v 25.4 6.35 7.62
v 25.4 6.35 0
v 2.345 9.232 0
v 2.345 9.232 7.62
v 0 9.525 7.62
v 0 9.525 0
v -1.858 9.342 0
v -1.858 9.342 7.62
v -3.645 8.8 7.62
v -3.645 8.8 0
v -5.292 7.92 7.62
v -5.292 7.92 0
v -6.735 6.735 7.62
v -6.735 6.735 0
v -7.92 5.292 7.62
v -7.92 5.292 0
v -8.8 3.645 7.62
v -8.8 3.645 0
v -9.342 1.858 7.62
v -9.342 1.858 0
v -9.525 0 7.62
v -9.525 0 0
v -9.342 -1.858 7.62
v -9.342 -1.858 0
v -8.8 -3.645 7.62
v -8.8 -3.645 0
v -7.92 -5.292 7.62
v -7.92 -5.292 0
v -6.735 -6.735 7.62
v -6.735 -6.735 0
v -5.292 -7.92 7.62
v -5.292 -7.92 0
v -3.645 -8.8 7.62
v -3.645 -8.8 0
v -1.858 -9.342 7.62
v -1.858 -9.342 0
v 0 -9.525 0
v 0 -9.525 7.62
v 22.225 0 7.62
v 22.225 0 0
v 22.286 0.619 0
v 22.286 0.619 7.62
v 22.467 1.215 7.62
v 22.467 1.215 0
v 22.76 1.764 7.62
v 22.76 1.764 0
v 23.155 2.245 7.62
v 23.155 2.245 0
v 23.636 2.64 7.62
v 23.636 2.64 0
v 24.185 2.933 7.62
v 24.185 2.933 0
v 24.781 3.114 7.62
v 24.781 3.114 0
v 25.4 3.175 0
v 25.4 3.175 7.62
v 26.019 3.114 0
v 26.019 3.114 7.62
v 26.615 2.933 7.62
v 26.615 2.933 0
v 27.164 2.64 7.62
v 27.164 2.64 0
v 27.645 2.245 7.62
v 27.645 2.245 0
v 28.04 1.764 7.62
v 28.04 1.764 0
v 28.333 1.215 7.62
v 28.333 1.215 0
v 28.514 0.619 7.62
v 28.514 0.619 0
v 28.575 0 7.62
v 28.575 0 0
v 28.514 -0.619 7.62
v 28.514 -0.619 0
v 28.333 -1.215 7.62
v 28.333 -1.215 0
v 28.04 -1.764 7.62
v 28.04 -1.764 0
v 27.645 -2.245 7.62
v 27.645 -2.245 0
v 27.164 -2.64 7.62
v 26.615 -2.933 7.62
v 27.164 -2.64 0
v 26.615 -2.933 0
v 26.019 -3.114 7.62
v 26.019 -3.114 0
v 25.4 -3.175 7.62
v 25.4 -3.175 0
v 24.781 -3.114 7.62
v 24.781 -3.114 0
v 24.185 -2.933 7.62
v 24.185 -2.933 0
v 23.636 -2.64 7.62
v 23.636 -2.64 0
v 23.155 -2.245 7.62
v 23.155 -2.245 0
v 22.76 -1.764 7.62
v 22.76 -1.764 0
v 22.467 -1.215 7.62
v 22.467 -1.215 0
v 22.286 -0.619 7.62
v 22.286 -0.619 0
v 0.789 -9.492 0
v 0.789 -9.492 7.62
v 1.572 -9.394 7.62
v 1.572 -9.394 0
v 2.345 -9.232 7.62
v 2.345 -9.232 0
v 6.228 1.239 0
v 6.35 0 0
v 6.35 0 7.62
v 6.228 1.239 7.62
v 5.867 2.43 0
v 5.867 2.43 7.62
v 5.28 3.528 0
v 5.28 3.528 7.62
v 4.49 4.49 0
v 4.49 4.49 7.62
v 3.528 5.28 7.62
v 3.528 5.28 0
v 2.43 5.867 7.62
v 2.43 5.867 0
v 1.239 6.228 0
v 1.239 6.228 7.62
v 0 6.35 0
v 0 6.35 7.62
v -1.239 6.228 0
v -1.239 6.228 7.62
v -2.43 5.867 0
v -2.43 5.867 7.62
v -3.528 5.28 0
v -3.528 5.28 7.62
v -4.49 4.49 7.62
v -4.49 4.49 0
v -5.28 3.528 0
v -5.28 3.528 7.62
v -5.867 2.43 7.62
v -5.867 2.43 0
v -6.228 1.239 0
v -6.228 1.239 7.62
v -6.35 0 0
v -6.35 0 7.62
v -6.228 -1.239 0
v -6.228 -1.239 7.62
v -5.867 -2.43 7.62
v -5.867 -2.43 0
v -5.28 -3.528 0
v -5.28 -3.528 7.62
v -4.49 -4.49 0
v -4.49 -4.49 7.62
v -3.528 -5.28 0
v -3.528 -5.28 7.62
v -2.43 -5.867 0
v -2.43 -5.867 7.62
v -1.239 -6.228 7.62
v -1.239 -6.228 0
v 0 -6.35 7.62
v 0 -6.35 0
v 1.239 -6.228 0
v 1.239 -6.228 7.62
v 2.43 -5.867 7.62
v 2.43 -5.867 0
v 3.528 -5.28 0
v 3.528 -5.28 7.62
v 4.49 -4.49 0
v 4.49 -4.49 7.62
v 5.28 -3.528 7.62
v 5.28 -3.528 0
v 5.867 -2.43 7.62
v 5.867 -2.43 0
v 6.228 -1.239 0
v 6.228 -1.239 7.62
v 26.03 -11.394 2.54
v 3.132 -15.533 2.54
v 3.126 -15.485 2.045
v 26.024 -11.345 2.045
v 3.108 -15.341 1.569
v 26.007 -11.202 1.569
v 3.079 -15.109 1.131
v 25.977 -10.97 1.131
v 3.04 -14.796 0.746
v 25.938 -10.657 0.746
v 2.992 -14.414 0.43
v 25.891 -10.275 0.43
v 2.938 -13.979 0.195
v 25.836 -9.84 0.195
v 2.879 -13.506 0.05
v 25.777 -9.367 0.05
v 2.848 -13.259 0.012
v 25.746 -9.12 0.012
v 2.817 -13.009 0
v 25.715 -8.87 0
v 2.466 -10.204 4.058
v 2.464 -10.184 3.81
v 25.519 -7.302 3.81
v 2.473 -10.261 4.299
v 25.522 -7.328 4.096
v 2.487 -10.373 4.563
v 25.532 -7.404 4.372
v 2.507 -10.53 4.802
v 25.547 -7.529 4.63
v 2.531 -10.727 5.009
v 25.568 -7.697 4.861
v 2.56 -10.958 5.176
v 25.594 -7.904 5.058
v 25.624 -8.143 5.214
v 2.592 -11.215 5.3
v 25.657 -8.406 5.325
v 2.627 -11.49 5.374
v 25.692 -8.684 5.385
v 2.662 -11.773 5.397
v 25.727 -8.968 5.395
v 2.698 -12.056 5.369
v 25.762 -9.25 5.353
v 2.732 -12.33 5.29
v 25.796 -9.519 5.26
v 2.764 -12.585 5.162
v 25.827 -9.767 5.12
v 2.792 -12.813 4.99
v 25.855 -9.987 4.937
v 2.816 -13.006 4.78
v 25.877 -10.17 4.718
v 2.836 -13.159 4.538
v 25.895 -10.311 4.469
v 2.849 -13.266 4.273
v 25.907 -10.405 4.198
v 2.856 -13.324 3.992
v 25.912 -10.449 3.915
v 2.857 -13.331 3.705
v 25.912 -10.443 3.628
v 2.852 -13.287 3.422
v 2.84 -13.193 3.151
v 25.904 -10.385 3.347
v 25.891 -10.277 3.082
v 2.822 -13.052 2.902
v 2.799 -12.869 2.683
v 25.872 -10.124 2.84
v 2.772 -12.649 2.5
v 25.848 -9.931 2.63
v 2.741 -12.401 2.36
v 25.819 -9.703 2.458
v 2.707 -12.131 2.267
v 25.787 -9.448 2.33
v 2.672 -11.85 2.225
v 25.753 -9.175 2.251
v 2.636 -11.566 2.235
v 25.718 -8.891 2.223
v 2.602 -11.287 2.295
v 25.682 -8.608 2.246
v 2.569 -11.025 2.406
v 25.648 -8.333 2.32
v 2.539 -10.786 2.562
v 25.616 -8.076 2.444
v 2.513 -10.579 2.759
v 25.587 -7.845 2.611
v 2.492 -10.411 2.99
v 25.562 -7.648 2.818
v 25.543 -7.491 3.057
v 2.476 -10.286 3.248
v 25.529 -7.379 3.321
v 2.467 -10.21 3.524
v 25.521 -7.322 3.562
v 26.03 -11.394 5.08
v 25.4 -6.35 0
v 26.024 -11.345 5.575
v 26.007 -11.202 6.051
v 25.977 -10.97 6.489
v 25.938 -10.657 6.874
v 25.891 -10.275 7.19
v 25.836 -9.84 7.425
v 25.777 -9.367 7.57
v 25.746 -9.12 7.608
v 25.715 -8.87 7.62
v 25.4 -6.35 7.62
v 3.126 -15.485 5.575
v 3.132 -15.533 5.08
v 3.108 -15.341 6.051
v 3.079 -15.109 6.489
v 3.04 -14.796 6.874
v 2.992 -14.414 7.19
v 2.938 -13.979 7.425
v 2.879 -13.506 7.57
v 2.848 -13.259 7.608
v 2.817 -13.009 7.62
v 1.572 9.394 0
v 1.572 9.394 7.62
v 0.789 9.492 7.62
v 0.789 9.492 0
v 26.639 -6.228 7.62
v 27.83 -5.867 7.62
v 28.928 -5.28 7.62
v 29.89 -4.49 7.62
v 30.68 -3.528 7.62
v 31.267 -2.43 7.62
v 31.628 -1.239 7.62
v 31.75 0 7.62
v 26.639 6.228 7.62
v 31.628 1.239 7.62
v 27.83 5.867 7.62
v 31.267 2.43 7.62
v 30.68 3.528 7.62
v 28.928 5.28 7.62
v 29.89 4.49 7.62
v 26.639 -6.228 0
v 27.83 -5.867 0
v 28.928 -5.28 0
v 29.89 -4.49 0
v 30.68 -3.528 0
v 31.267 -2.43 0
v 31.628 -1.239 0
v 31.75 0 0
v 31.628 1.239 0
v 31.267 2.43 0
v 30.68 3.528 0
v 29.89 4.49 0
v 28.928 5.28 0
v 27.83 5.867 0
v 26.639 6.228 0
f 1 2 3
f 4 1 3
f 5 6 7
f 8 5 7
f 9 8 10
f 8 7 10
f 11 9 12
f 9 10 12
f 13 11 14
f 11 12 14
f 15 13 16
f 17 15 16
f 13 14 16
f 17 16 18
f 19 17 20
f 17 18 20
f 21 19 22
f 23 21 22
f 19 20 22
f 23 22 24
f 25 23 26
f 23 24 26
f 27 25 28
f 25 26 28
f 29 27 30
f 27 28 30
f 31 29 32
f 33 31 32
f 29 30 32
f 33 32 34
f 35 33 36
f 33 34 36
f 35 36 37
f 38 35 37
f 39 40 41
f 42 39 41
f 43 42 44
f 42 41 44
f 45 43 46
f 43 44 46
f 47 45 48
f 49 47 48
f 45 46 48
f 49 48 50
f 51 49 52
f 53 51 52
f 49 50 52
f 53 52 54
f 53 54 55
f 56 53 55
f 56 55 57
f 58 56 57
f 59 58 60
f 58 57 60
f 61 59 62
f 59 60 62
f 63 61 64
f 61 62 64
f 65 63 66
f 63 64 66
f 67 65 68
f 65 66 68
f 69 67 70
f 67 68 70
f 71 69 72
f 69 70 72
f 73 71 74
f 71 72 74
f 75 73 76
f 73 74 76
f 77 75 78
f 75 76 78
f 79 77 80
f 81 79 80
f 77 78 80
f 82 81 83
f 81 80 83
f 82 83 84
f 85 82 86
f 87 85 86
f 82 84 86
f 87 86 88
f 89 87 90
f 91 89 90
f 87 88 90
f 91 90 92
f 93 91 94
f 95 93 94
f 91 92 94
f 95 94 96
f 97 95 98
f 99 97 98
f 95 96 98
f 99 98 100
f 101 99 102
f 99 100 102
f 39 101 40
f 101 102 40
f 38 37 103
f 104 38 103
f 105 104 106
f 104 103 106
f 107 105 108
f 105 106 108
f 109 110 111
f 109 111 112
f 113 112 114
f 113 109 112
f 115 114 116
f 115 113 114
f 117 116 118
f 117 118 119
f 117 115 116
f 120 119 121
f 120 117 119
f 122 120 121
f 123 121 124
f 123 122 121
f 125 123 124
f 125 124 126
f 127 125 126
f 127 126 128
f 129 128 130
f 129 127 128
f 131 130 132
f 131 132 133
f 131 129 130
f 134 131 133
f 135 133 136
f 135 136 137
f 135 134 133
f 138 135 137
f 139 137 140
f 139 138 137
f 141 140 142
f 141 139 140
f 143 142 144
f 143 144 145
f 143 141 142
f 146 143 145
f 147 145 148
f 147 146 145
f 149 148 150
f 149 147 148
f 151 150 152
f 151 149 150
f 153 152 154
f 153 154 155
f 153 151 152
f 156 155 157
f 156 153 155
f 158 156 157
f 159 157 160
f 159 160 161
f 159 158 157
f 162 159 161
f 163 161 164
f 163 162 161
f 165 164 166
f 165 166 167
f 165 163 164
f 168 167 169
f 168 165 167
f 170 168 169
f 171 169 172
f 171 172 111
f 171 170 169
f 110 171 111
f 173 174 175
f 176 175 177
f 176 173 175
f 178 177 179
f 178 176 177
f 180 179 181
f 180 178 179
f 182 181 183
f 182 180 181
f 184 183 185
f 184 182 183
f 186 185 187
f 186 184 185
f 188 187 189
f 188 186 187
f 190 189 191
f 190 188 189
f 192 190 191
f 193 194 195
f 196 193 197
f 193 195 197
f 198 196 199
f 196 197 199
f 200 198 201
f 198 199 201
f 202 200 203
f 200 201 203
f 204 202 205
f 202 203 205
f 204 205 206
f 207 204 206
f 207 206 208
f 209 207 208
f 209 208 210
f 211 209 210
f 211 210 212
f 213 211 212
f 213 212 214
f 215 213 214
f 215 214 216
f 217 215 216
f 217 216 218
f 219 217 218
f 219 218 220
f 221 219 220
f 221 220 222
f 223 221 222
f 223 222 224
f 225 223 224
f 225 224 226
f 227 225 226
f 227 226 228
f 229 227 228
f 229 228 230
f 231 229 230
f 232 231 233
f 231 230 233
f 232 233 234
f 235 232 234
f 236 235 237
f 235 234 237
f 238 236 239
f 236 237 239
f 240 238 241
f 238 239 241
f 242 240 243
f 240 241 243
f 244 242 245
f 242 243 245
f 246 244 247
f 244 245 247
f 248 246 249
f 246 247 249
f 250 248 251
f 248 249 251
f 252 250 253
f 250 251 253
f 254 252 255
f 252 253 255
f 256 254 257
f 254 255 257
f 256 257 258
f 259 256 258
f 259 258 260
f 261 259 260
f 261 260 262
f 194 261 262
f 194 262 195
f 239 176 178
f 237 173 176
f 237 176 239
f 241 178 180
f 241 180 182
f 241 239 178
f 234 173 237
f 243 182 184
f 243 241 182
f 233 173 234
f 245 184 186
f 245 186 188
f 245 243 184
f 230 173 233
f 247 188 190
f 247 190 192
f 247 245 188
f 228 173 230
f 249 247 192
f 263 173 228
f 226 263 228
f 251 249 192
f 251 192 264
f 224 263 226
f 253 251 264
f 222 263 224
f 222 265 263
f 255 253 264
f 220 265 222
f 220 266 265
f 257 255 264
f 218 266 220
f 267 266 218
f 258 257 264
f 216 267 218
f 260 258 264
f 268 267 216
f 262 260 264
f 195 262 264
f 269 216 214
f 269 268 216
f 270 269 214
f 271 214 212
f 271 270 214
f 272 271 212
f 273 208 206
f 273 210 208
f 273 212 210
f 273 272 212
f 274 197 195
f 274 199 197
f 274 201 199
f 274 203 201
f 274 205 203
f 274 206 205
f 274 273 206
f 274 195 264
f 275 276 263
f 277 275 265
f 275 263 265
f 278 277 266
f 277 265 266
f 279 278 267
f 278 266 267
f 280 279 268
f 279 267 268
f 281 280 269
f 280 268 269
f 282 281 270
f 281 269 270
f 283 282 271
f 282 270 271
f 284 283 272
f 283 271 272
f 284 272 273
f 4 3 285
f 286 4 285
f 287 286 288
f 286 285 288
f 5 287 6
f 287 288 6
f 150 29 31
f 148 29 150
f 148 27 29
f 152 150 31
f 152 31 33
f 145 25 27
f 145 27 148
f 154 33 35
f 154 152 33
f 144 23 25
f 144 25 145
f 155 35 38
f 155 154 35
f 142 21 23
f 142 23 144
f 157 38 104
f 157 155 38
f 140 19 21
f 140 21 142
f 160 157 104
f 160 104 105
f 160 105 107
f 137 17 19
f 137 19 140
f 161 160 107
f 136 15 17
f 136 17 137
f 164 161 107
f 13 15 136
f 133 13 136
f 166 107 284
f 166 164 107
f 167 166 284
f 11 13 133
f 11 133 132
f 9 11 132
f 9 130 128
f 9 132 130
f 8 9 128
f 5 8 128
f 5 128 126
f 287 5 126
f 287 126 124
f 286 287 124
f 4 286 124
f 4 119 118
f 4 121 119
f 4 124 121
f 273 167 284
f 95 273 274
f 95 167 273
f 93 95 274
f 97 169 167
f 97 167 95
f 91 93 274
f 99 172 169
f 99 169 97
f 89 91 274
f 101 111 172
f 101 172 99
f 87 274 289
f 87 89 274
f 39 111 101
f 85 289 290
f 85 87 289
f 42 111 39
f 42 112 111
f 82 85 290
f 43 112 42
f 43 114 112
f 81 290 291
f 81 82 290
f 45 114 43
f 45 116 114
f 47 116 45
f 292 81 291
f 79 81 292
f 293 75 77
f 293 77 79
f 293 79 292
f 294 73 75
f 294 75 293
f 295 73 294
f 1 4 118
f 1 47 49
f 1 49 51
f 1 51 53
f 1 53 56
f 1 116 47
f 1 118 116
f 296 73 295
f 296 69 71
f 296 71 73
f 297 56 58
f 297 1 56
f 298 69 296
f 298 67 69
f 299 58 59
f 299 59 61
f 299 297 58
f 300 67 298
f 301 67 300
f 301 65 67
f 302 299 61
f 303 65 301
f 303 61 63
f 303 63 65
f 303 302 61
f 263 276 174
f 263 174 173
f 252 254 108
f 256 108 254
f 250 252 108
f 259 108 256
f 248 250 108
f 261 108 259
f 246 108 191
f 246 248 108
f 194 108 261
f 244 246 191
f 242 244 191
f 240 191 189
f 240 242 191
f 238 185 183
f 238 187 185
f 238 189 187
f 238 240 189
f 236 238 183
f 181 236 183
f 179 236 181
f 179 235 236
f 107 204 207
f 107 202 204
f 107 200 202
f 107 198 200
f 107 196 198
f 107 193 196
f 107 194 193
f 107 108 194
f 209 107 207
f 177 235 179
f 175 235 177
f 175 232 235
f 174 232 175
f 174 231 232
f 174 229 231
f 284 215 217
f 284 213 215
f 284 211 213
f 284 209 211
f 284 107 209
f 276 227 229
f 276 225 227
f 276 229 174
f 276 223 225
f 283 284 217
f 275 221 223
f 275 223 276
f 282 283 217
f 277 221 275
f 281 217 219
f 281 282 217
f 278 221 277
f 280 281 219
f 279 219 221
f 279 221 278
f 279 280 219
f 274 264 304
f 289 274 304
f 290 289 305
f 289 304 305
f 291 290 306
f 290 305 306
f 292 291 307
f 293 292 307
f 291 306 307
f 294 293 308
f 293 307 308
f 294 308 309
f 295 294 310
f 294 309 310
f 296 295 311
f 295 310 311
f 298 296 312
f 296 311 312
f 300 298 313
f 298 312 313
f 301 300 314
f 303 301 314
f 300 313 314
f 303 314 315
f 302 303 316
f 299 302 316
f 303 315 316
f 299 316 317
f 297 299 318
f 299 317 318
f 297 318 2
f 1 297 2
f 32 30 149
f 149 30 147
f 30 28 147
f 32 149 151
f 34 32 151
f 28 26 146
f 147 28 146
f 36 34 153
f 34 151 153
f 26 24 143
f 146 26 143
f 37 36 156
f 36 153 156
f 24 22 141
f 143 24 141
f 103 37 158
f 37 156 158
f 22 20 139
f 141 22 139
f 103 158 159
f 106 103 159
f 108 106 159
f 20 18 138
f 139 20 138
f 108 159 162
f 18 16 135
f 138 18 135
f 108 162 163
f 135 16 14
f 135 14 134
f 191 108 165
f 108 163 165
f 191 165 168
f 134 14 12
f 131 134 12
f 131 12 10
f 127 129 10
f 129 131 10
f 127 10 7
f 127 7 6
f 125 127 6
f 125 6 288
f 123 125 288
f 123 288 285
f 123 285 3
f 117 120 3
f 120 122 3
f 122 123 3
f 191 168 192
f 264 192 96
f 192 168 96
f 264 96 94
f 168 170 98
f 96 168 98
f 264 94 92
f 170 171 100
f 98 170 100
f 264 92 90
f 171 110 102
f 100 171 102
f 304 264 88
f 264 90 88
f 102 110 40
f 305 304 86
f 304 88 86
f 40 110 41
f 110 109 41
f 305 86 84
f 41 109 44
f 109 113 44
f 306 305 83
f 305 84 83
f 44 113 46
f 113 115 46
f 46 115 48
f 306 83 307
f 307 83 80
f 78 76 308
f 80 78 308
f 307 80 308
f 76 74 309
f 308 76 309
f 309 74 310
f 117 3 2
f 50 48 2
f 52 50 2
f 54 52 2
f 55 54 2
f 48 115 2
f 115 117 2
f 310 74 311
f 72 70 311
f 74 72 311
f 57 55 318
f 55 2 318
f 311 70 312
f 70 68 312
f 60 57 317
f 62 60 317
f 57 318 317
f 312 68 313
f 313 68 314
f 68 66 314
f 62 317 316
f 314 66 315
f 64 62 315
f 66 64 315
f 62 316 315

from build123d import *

# Parameters (mm, degrees)
F0_R     = 6.35
F1_DEPTH = 7.62
F3_DEPTH = 7.62
F4_R     = 1.5875
F5_DEPTH = 25.4
F6_R     = 2.54


with BuildPart() as f1:
    # F0 (on Top) → F1 (new body)
    with BuildSketch(Plane.XY):
        with BuildLine():
            ThreePointArc((28.575, 0), (25.4, 3.175), (22.225, 0))
            ThreePointArc((22.225, 0), (25.4, -3.175), (28.575, 0))
        make_face()
        Circle(F0_R)
        with BuildLine():
            Line((0, 9.525), (2.344615, 9.231923))
            ThreePointArc((2.344615, 9.231923), (1.181431, 9.451447), (0, 9.525))
        make_face()
        with BuildLine():
            Line((25.4, 6.35), (2.344615, 9.231923))
            Line((2.344615, 9.231923), (0, 9.525))
            ThreePointArc((0, 9.525), (-9.525, 0), (0, -9.525))
            Line((0, -9.525), (2.344615, -9.231923))
            Line((2.344615, -9.231923), (25.4, -6.35))
            ThreePointArc((25.4, -6.35), (31.75, 0), (25.4, 6.35))
        make_face()
        Circle(F0_R, mode=Mode.SUBTRACT)
        with BuildLine():
            ThreePointArc((28.575, 0), (25.4, -3.175), (22.225, 0))
            ThreePointArc((22.225, 0), (25.4, 3.175), (28.575, 0))
        make_face(mode=Mode.SUBTRACT)
        with BuildLine():
            Line((2.344615, -9.231923), (0, -9.525))
            ThreePointArc((0, -9.525), (1.181431, -9.451447), (2.344615, -9.231923))
        make_face()
    extrude(amount=F1_DEPTH)

    # F2 (on face) → F3 (join)
    with BuildSketch(Plane.XY.offset(7.62)):
        Polygon((26.030454, -11.393635), (25.4, -6.35), (2.344615, -9.231923), (3.132236, -15.532888), align=None)
    extrude(amount=-F3_DEPTH)

    # F4 (on face) → F5 (cut)
    with BuildSketch(Plane(origin=(24.227692, 3.028462, 0), x_dir=(-0.124035, 0.992278, 0), z_dir=(0.992278, 0.124035, 0))):
        with Locations((-11.998785, 3.81)):
            Circle(F4_R)
    extrude(amount=-F5_DEPTH, mode=Mode.SUBTRACT)

    # F6
    f6_edges = [f1.edges().sort_by_distance(p)[0] for p in [
        (14.581345, -13.463261, 7.62),
        (14.581345, -13.463261, 0),
    ]]
    fillet(f6_edges, radius=F6_R)


solid = f1.part
